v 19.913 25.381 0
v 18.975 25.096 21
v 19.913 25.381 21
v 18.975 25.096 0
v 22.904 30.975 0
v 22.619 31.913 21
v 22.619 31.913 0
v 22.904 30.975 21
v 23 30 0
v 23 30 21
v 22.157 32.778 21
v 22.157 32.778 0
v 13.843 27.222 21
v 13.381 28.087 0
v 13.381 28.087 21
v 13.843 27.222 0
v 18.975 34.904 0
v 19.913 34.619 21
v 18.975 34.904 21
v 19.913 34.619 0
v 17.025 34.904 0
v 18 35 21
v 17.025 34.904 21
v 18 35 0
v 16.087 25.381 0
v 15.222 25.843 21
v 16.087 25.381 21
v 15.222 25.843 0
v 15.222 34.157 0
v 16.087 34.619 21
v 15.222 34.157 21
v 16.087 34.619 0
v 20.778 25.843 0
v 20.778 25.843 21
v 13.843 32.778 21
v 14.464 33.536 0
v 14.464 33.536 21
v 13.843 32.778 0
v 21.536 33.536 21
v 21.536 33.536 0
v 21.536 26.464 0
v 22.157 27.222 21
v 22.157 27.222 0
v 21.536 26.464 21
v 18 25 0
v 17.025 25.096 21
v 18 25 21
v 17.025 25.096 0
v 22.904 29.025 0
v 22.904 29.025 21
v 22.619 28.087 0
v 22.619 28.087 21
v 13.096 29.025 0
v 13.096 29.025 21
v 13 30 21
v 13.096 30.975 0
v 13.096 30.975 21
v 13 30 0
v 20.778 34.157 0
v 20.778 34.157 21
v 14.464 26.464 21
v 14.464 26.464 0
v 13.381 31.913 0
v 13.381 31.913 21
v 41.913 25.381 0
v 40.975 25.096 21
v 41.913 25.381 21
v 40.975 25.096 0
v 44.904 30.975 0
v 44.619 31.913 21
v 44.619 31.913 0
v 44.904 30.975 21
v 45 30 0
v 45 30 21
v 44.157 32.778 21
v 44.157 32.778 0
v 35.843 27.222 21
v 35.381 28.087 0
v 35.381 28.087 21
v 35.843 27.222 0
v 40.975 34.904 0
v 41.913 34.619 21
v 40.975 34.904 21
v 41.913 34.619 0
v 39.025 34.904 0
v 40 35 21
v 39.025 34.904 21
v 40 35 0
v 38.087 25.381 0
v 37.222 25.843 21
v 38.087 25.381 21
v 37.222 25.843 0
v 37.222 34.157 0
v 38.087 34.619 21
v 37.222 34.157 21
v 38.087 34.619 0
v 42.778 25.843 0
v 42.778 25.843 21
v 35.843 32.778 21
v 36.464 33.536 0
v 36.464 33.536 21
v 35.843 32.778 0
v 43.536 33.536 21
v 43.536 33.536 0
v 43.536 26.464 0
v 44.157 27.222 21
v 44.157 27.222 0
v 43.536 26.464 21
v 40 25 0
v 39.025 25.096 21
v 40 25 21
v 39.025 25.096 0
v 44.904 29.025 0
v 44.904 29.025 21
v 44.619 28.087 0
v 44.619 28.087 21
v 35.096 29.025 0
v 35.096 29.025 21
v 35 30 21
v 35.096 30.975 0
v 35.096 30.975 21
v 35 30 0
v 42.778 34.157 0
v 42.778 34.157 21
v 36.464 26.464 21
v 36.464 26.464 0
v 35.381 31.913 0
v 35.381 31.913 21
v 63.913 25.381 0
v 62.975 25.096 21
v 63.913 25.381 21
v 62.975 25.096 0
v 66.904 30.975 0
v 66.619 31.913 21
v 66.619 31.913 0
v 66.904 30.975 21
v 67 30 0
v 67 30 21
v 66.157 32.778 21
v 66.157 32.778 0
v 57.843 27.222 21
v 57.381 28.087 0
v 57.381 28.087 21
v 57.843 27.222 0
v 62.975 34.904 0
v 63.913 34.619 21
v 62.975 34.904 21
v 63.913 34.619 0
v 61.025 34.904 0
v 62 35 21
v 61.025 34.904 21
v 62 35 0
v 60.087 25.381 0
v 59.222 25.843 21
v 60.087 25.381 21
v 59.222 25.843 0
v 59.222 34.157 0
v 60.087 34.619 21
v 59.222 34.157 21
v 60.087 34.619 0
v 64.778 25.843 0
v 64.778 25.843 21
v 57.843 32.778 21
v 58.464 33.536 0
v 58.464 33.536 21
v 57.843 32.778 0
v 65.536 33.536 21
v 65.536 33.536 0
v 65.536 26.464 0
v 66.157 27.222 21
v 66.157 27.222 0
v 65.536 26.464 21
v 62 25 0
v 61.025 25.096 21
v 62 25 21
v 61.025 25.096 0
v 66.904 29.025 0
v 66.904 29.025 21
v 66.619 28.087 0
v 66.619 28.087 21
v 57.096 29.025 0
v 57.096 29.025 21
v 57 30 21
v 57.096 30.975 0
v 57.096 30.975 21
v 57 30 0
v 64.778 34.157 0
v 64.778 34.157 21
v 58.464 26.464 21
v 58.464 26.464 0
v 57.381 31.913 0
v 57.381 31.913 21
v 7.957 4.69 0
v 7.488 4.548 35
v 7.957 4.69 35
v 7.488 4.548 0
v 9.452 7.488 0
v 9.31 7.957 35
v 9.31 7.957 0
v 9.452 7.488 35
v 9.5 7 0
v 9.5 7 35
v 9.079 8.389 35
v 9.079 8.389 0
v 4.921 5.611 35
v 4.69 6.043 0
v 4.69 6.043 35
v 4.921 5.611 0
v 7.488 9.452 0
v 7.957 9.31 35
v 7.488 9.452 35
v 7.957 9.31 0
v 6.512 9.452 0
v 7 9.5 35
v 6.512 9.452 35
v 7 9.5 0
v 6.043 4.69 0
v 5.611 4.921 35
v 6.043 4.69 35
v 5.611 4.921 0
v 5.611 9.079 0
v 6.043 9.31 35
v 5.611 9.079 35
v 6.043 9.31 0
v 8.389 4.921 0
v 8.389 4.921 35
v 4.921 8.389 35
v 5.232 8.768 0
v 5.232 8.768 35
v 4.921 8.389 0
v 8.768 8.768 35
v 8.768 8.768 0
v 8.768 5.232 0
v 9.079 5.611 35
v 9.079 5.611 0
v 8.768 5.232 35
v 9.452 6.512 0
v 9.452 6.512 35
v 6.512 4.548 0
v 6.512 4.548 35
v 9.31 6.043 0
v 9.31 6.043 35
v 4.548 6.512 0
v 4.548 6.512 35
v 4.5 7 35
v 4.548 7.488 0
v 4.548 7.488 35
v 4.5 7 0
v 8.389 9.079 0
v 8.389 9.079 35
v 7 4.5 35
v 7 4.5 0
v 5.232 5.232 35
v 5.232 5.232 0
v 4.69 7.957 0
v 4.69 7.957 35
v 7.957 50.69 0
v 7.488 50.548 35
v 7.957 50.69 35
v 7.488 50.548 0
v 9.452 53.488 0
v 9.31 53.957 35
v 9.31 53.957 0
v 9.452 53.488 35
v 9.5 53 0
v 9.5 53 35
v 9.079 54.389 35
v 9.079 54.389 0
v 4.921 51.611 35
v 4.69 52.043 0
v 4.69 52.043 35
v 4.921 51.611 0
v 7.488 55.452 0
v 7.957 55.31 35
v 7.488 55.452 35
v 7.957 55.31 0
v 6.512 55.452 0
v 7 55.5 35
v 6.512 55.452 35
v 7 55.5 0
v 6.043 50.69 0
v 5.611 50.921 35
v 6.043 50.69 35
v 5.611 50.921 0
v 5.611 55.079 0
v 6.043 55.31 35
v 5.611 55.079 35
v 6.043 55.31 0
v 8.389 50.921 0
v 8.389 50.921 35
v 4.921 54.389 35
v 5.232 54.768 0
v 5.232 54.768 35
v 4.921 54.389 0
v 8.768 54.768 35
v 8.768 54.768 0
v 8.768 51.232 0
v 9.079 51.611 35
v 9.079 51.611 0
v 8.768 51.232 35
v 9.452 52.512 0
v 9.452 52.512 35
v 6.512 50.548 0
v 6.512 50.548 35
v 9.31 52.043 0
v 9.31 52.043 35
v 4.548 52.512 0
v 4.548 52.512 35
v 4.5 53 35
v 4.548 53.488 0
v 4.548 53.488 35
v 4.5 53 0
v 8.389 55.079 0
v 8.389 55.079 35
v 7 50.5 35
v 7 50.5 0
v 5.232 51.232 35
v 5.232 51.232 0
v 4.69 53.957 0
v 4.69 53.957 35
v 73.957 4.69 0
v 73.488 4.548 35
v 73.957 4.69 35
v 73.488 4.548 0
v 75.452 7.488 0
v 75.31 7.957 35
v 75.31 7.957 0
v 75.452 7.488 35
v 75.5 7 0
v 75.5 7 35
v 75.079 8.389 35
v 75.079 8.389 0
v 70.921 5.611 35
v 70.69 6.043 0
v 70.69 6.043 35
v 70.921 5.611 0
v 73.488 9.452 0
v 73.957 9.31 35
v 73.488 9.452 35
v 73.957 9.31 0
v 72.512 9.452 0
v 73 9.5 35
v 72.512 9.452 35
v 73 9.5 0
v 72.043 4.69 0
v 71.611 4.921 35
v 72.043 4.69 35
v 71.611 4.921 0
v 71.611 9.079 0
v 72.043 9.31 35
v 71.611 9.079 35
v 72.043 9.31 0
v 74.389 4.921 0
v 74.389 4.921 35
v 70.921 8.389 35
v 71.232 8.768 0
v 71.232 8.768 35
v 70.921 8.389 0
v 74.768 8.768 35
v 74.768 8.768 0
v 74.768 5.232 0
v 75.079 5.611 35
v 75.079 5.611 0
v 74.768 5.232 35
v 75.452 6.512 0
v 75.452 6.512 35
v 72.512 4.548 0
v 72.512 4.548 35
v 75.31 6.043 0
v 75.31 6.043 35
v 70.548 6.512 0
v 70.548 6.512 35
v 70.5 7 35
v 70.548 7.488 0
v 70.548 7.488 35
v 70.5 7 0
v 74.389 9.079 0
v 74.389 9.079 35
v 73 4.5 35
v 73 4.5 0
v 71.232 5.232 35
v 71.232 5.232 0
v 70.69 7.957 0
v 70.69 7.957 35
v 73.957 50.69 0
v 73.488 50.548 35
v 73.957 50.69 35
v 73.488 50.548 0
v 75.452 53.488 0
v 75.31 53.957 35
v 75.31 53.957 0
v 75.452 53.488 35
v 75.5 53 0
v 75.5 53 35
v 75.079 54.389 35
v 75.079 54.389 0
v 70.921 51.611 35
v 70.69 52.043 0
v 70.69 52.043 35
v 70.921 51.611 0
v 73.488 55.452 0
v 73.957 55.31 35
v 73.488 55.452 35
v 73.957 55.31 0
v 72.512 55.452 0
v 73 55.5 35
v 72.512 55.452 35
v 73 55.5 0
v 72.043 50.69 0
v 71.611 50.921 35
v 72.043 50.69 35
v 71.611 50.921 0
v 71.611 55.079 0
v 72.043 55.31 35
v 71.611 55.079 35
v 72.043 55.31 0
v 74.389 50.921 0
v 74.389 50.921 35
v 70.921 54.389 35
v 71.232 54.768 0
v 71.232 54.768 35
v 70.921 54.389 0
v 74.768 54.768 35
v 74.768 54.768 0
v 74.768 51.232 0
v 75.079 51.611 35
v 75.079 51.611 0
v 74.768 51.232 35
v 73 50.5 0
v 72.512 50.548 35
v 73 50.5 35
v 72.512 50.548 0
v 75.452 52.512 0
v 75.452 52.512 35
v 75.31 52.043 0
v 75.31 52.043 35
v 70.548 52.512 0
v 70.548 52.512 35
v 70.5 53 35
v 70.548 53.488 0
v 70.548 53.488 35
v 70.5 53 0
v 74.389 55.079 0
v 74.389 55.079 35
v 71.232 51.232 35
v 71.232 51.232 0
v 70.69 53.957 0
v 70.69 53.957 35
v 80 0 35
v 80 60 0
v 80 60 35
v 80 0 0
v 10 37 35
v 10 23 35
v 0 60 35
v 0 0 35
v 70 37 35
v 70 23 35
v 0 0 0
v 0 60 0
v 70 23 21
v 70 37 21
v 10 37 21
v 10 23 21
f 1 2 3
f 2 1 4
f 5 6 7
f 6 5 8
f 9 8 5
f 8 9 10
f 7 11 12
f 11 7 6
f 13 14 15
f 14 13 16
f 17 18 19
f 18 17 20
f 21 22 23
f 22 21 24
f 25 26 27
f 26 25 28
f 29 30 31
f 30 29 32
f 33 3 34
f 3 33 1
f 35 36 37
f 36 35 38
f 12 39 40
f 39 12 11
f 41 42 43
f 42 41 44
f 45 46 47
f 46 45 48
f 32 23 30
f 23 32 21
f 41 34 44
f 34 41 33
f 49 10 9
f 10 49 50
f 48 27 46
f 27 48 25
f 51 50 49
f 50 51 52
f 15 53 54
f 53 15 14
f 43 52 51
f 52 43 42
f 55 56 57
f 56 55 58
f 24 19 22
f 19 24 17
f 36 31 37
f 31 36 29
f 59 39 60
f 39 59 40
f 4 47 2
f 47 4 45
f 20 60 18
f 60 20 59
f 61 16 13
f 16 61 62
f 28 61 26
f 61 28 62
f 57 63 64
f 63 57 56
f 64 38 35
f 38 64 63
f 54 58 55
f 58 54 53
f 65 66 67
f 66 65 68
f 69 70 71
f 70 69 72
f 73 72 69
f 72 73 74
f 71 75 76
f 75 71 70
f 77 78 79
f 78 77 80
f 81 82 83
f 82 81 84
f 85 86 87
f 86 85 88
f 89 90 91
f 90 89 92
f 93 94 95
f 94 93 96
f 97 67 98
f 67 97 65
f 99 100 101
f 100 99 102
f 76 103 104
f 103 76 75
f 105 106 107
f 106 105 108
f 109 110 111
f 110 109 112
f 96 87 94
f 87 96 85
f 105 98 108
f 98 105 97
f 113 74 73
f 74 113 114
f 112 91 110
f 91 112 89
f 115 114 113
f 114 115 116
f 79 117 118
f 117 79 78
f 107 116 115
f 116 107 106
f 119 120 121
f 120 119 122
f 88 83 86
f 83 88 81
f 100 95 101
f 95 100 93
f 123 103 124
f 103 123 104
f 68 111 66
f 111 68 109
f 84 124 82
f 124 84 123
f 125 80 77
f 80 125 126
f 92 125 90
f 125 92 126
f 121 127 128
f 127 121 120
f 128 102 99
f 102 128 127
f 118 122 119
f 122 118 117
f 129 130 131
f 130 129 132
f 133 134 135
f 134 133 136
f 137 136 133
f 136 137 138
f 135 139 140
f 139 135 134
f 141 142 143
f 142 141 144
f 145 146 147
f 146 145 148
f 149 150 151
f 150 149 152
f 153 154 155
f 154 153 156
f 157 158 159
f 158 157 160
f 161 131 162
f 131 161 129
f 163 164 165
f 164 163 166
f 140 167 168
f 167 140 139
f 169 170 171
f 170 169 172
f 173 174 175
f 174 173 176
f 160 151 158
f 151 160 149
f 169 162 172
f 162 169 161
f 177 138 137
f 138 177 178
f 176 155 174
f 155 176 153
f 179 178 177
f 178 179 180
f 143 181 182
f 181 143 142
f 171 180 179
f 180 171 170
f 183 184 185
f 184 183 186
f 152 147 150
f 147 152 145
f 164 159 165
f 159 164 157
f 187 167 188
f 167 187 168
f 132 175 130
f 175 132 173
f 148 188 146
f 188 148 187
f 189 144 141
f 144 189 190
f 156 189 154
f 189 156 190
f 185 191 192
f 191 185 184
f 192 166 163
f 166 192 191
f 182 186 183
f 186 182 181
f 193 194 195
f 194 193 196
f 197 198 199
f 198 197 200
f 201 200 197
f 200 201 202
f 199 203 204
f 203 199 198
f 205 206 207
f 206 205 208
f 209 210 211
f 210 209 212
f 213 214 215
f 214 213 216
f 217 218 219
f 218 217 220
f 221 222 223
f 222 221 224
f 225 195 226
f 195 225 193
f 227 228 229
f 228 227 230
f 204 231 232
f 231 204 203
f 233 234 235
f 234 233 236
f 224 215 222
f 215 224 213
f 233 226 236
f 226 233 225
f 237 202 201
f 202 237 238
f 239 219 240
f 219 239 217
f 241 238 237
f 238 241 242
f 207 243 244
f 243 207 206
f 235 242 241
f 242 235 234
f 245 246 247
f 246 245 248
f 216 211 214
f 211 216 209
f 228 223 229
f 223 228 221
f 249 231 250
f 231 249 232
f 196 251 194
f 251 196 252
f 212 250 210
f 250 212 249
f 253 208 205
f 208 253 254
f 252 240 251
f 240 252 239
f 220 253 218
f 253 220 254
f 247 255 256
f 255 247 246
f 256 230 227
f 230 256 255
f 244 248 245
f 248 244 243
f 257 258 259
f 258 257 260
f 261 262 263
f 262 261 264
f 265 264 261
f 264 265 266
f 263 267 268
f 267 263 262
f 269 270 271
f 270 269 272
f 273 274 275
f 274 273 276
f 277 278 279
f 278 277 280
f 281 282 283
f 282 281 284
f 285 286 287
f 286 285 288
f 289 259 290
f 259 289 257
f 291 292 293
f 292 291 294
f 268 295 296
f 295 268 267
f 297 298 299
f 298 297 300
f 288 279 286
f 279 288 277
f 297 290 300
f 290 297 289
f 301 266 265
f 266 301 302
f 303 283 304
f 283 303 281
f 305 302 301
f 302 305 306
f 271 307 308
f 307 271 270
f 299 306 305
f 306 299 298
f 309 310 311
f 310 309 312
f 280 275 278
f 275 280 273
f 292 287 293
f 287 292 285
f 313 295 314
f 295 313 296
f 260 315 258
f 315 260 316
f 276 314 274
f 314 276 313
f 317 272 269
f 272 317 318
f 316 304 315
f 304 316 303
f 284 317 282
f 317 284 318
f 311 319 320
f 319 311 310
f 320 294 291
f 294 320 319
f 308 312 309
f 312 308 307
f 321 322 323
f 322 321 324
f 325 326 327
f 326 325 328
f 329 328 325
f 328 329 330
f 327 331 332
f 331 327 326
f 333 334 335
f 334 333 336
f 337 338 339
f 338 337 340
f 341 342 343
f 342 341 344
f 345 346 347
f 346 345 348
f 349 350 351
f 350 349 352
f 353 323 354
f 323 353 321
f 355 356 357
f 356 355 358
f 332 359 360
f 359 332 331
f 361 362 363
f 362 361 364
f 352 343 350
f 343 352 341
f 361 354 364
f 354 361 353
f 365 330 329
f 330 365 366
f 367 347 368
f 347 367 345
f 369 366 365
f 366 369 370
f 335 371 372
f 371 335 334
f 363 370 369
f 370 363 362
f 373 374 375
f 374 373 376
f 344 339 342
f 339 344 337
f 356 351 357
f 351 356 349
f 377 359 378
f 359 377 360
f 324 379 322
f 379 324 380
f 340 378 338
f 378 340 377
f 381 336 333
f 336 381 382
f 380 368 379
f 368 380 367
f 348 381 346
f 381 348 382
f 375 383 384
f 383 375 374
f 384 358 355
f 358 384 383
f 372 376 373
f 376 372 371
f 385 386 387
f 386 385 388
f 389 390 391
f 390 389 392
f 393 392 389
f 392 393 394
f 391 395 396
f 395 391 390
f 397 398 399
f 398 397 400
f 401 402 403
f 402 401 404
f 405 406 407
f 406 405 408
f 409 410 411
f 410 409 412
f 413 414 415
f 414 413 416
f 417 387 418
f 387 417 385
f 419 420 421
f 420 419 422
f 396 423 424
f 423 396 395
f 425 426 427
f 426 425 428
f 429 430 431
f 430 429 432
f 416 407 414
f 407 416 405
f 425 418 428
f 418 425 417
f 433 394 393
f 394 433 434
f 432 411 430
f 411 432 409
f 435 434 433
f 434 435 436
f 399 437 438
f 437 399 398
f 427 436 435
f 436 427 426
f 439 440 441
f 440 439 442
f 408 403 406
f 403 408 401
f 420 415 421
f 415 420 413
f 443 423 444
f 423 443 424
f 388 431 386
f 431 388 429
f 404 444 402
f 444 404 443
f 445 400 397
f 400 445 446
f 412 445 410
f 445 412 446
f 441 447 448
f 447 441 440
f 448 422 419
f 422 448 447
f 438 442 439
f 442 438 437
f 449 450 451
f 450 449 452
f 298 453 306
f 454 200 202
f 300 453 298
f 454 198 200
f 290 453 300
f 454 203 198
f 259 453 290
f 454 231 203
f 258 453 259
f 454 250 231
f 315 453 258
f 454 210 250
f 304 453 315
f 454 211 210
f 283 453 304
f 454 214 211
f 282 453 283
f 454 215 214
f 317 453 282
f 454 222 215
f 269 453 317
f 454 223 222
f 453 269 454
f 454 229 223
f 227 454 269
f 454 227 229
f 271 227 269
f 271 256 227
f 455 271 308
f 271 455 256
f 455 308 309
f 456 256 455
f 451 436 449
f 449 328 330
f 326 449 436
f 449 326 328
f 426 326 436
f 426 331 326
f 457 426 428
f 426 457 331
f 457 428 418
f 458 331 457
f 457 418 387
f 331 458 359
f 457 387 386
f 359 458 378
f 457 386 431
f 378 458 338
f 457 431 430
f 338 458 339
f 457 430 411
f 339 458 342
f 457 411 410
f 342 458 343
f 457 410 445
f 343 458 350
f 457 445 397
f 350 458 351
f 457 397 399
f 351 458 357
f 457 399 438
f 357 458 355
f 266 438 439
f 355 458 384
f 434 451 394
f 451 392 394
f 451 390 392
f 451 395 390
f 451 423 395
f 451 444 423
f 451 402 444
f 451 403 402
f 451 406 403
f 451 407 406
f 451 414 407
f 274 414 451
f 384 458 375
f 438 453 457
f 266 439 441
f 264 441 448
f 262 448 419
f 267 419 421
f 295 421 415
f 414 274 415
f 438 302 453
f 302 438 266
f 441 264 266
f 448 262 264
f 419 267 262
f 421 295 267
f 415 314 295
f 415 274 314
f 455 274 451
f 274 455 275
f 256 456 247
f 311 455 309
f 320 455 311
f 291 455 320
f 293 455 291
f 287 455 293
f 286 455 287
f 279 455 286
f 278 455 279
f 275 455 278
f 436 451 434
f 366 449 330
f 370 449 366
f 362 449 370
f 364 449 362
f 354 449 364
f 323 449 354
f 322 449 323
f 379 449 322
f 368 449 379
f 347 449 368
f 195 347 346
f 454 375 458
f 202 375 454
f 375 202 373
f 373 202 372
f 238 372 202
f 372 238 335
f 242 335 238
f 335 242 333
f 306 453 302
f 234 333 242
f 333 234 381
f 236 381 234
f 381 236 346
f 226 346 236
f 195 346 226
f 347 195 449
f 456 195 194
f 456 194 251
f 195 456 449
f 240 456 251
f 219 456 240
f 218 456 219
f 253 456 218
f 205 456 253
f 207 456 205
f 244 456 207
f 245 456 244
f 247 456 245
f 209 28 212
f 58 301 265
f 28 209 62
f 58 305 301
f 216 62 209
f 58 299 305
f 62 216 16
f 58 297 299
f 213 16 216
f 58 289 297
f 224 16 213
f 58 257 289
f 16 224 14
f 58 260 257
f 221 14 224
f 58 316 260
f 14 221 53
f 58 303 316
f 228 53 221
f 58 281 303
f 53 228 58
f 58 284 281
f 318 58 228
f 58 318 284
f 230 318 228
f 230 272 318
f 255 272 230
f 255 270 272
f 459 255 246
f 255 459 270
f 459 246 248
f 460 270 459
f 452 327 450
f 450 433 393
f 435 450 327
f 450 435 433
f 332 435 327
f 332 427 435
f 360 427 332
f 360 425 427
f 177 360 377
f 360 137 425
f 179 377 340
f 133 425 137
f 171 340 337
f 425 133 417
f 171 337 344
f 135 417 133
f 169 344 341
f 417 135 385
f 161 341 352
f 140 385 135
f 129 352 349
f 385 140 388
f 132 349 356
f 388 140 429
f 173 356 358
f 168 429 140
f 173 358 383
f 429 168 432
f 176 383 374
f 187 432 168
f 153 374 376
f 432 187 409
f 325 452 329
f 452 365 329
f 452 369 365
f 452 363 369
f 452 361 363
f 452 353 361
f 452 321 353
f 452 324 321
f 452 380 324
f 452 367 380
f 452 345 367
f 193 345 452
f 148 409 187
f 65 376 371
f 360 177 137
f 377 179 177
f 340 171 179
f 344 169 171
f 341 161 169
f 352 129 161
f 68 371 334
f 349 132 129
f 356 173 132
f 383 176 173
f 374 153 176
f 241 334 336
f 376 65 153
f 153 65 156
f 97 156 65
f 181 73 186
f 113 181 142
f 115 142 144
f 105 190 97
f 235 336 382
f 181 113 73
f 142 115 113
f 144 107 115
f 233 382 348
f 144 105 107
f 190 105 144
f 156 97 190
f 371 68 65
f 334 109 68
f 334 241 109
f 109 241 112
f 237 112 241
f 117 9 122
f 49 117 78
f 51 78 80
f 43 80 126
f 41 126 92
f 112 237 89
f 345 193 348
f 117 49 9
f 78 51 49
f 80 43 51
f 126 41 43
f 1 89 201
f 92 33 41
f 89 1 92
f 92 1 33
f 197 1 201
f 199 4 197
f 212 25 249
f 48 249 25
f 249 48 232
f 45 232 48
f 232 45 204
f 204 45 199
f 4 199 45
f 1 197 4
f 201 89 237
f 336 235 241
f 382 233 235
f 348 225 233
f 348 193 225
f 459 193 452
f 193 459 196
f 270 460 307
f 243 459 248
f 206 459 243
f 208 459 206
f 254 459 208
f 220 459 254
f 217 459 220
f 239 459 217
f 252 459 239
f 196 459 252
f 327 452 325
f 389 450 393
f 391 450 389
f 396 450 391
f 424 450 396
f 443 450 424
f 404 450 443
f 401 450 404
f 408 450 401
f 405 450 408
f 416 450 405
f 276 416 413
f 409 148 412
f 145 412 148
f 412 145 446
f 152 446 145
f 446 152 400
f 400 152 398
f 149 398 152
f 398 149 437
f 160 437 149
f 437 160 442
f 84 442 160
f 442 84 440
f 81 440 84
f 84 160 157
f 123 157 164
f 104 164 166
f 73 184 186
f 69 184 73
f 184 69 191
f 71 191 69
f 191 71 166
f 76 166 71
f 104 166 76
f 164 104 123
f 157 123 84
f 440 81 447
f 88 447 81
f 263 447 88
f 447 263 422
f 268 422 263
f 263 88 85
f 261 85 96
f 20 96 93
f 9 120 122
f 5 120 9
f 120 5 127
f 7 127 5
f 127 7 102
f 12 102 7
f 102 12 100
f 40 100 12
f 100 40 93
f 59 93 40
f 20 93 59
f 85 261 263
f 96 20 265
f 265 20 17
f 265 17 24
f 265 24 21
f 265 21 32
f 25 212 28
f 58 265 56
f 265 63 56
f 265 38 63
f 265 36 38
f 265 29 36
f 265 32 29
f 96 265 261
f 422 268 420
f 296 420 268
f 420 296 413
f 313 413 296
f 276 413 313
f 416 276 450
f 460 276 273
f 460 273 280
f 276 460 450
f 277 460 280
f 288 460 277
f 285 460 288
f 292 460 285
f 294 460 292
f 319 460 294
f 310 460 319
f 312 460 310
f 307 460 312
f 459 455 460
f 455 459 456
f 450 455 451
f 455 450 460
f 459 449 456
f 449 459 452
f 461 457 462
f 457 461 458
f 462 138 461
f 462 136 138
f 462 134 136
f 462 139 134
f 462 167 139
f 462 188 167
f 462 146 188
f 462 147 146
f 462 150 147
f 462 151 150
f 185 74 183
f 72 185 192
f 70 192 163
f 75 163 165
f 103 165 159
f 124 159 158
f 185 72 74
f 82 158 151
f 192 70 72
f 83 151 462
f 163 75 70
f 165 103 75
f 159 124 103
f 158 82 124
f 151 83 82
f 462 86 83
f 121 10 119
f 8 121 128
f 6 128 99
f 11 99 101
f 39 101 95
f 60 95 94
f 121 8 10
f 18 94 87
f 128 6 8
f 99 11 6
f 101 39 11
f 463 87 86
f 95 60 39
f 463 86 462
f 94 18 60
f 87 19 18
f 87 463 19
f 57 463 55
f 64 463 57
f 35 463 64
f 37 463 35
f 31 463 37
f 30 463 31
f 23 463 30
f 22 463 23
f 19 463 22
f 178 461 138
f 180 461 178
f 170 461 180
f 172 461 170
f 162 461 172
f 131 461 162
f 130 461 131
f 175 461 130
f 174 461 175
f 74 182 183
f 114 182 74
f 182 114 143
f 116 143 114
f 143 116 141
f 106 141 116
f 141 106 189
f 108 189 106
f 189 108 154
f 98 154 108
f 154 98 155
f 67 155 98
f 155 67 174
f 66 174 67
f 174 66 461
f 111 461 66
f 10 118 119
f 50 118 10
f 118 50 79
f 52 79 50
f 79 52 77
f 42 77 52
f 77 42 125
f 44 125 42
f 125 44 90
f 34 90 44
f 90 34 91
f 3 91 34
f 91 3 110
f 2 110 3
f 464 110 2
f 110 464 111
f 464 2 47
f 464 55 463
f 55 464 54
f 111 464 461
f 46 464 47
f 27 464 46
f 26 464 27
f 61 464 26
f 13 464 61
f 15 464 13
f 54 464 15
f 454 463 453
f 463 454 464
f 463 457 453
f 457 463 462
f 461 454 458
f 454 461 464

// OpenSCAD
$fn = 32;

// ----------------------------------------------------------------------
// Manifold block: gallery_top manifold
// ----------------------------------------------------------------------

// --- parameters (mm) ---
block_l = 80;             // block length, X
block_w = 60;             // block width, Y
block_h = 35;             // block height, Z
port_d = 10;              // port bore diameter
port_pitch = 22;          // port pitch along X
gallery_d = 14;           // top gallery width, Y
gallery_depth = 14;       // gallery pocket depth
wall_p = 10;              // gallery end wall thickness, X
mnt_d = 5;                // mounting hole diameter
mnt_in = 7;               // mounting hole inset from the edges

n_ports = 3;  // ports in the row
port_x0 = (block_l - (n_ports - 1) * port_pitch) / 2;  // first port X

difference() {
  cube([block_l, block_w, block_h]);
  for (i = [0 : n_ports - 1])
    translate([port_x0 + i * port_pitch, block_w / 2, -1])
      cylinder(h = block_h + 2, d = port_d);
  translate([wall_p, block_w / 2 - gallery_d / 2, block_h - gallery_depth])
    cube([block_l - 2 * wall_p, gallery_d, gallery_depth + 1]);
  for (cx = [mnt_in, block_l - mnt_in])
    for (cy = [mnt_in, block_w - mnt_in])
      translate([cx, cy, -1]) cylinder(h = block_h + 2, d = mnt_d);
}
